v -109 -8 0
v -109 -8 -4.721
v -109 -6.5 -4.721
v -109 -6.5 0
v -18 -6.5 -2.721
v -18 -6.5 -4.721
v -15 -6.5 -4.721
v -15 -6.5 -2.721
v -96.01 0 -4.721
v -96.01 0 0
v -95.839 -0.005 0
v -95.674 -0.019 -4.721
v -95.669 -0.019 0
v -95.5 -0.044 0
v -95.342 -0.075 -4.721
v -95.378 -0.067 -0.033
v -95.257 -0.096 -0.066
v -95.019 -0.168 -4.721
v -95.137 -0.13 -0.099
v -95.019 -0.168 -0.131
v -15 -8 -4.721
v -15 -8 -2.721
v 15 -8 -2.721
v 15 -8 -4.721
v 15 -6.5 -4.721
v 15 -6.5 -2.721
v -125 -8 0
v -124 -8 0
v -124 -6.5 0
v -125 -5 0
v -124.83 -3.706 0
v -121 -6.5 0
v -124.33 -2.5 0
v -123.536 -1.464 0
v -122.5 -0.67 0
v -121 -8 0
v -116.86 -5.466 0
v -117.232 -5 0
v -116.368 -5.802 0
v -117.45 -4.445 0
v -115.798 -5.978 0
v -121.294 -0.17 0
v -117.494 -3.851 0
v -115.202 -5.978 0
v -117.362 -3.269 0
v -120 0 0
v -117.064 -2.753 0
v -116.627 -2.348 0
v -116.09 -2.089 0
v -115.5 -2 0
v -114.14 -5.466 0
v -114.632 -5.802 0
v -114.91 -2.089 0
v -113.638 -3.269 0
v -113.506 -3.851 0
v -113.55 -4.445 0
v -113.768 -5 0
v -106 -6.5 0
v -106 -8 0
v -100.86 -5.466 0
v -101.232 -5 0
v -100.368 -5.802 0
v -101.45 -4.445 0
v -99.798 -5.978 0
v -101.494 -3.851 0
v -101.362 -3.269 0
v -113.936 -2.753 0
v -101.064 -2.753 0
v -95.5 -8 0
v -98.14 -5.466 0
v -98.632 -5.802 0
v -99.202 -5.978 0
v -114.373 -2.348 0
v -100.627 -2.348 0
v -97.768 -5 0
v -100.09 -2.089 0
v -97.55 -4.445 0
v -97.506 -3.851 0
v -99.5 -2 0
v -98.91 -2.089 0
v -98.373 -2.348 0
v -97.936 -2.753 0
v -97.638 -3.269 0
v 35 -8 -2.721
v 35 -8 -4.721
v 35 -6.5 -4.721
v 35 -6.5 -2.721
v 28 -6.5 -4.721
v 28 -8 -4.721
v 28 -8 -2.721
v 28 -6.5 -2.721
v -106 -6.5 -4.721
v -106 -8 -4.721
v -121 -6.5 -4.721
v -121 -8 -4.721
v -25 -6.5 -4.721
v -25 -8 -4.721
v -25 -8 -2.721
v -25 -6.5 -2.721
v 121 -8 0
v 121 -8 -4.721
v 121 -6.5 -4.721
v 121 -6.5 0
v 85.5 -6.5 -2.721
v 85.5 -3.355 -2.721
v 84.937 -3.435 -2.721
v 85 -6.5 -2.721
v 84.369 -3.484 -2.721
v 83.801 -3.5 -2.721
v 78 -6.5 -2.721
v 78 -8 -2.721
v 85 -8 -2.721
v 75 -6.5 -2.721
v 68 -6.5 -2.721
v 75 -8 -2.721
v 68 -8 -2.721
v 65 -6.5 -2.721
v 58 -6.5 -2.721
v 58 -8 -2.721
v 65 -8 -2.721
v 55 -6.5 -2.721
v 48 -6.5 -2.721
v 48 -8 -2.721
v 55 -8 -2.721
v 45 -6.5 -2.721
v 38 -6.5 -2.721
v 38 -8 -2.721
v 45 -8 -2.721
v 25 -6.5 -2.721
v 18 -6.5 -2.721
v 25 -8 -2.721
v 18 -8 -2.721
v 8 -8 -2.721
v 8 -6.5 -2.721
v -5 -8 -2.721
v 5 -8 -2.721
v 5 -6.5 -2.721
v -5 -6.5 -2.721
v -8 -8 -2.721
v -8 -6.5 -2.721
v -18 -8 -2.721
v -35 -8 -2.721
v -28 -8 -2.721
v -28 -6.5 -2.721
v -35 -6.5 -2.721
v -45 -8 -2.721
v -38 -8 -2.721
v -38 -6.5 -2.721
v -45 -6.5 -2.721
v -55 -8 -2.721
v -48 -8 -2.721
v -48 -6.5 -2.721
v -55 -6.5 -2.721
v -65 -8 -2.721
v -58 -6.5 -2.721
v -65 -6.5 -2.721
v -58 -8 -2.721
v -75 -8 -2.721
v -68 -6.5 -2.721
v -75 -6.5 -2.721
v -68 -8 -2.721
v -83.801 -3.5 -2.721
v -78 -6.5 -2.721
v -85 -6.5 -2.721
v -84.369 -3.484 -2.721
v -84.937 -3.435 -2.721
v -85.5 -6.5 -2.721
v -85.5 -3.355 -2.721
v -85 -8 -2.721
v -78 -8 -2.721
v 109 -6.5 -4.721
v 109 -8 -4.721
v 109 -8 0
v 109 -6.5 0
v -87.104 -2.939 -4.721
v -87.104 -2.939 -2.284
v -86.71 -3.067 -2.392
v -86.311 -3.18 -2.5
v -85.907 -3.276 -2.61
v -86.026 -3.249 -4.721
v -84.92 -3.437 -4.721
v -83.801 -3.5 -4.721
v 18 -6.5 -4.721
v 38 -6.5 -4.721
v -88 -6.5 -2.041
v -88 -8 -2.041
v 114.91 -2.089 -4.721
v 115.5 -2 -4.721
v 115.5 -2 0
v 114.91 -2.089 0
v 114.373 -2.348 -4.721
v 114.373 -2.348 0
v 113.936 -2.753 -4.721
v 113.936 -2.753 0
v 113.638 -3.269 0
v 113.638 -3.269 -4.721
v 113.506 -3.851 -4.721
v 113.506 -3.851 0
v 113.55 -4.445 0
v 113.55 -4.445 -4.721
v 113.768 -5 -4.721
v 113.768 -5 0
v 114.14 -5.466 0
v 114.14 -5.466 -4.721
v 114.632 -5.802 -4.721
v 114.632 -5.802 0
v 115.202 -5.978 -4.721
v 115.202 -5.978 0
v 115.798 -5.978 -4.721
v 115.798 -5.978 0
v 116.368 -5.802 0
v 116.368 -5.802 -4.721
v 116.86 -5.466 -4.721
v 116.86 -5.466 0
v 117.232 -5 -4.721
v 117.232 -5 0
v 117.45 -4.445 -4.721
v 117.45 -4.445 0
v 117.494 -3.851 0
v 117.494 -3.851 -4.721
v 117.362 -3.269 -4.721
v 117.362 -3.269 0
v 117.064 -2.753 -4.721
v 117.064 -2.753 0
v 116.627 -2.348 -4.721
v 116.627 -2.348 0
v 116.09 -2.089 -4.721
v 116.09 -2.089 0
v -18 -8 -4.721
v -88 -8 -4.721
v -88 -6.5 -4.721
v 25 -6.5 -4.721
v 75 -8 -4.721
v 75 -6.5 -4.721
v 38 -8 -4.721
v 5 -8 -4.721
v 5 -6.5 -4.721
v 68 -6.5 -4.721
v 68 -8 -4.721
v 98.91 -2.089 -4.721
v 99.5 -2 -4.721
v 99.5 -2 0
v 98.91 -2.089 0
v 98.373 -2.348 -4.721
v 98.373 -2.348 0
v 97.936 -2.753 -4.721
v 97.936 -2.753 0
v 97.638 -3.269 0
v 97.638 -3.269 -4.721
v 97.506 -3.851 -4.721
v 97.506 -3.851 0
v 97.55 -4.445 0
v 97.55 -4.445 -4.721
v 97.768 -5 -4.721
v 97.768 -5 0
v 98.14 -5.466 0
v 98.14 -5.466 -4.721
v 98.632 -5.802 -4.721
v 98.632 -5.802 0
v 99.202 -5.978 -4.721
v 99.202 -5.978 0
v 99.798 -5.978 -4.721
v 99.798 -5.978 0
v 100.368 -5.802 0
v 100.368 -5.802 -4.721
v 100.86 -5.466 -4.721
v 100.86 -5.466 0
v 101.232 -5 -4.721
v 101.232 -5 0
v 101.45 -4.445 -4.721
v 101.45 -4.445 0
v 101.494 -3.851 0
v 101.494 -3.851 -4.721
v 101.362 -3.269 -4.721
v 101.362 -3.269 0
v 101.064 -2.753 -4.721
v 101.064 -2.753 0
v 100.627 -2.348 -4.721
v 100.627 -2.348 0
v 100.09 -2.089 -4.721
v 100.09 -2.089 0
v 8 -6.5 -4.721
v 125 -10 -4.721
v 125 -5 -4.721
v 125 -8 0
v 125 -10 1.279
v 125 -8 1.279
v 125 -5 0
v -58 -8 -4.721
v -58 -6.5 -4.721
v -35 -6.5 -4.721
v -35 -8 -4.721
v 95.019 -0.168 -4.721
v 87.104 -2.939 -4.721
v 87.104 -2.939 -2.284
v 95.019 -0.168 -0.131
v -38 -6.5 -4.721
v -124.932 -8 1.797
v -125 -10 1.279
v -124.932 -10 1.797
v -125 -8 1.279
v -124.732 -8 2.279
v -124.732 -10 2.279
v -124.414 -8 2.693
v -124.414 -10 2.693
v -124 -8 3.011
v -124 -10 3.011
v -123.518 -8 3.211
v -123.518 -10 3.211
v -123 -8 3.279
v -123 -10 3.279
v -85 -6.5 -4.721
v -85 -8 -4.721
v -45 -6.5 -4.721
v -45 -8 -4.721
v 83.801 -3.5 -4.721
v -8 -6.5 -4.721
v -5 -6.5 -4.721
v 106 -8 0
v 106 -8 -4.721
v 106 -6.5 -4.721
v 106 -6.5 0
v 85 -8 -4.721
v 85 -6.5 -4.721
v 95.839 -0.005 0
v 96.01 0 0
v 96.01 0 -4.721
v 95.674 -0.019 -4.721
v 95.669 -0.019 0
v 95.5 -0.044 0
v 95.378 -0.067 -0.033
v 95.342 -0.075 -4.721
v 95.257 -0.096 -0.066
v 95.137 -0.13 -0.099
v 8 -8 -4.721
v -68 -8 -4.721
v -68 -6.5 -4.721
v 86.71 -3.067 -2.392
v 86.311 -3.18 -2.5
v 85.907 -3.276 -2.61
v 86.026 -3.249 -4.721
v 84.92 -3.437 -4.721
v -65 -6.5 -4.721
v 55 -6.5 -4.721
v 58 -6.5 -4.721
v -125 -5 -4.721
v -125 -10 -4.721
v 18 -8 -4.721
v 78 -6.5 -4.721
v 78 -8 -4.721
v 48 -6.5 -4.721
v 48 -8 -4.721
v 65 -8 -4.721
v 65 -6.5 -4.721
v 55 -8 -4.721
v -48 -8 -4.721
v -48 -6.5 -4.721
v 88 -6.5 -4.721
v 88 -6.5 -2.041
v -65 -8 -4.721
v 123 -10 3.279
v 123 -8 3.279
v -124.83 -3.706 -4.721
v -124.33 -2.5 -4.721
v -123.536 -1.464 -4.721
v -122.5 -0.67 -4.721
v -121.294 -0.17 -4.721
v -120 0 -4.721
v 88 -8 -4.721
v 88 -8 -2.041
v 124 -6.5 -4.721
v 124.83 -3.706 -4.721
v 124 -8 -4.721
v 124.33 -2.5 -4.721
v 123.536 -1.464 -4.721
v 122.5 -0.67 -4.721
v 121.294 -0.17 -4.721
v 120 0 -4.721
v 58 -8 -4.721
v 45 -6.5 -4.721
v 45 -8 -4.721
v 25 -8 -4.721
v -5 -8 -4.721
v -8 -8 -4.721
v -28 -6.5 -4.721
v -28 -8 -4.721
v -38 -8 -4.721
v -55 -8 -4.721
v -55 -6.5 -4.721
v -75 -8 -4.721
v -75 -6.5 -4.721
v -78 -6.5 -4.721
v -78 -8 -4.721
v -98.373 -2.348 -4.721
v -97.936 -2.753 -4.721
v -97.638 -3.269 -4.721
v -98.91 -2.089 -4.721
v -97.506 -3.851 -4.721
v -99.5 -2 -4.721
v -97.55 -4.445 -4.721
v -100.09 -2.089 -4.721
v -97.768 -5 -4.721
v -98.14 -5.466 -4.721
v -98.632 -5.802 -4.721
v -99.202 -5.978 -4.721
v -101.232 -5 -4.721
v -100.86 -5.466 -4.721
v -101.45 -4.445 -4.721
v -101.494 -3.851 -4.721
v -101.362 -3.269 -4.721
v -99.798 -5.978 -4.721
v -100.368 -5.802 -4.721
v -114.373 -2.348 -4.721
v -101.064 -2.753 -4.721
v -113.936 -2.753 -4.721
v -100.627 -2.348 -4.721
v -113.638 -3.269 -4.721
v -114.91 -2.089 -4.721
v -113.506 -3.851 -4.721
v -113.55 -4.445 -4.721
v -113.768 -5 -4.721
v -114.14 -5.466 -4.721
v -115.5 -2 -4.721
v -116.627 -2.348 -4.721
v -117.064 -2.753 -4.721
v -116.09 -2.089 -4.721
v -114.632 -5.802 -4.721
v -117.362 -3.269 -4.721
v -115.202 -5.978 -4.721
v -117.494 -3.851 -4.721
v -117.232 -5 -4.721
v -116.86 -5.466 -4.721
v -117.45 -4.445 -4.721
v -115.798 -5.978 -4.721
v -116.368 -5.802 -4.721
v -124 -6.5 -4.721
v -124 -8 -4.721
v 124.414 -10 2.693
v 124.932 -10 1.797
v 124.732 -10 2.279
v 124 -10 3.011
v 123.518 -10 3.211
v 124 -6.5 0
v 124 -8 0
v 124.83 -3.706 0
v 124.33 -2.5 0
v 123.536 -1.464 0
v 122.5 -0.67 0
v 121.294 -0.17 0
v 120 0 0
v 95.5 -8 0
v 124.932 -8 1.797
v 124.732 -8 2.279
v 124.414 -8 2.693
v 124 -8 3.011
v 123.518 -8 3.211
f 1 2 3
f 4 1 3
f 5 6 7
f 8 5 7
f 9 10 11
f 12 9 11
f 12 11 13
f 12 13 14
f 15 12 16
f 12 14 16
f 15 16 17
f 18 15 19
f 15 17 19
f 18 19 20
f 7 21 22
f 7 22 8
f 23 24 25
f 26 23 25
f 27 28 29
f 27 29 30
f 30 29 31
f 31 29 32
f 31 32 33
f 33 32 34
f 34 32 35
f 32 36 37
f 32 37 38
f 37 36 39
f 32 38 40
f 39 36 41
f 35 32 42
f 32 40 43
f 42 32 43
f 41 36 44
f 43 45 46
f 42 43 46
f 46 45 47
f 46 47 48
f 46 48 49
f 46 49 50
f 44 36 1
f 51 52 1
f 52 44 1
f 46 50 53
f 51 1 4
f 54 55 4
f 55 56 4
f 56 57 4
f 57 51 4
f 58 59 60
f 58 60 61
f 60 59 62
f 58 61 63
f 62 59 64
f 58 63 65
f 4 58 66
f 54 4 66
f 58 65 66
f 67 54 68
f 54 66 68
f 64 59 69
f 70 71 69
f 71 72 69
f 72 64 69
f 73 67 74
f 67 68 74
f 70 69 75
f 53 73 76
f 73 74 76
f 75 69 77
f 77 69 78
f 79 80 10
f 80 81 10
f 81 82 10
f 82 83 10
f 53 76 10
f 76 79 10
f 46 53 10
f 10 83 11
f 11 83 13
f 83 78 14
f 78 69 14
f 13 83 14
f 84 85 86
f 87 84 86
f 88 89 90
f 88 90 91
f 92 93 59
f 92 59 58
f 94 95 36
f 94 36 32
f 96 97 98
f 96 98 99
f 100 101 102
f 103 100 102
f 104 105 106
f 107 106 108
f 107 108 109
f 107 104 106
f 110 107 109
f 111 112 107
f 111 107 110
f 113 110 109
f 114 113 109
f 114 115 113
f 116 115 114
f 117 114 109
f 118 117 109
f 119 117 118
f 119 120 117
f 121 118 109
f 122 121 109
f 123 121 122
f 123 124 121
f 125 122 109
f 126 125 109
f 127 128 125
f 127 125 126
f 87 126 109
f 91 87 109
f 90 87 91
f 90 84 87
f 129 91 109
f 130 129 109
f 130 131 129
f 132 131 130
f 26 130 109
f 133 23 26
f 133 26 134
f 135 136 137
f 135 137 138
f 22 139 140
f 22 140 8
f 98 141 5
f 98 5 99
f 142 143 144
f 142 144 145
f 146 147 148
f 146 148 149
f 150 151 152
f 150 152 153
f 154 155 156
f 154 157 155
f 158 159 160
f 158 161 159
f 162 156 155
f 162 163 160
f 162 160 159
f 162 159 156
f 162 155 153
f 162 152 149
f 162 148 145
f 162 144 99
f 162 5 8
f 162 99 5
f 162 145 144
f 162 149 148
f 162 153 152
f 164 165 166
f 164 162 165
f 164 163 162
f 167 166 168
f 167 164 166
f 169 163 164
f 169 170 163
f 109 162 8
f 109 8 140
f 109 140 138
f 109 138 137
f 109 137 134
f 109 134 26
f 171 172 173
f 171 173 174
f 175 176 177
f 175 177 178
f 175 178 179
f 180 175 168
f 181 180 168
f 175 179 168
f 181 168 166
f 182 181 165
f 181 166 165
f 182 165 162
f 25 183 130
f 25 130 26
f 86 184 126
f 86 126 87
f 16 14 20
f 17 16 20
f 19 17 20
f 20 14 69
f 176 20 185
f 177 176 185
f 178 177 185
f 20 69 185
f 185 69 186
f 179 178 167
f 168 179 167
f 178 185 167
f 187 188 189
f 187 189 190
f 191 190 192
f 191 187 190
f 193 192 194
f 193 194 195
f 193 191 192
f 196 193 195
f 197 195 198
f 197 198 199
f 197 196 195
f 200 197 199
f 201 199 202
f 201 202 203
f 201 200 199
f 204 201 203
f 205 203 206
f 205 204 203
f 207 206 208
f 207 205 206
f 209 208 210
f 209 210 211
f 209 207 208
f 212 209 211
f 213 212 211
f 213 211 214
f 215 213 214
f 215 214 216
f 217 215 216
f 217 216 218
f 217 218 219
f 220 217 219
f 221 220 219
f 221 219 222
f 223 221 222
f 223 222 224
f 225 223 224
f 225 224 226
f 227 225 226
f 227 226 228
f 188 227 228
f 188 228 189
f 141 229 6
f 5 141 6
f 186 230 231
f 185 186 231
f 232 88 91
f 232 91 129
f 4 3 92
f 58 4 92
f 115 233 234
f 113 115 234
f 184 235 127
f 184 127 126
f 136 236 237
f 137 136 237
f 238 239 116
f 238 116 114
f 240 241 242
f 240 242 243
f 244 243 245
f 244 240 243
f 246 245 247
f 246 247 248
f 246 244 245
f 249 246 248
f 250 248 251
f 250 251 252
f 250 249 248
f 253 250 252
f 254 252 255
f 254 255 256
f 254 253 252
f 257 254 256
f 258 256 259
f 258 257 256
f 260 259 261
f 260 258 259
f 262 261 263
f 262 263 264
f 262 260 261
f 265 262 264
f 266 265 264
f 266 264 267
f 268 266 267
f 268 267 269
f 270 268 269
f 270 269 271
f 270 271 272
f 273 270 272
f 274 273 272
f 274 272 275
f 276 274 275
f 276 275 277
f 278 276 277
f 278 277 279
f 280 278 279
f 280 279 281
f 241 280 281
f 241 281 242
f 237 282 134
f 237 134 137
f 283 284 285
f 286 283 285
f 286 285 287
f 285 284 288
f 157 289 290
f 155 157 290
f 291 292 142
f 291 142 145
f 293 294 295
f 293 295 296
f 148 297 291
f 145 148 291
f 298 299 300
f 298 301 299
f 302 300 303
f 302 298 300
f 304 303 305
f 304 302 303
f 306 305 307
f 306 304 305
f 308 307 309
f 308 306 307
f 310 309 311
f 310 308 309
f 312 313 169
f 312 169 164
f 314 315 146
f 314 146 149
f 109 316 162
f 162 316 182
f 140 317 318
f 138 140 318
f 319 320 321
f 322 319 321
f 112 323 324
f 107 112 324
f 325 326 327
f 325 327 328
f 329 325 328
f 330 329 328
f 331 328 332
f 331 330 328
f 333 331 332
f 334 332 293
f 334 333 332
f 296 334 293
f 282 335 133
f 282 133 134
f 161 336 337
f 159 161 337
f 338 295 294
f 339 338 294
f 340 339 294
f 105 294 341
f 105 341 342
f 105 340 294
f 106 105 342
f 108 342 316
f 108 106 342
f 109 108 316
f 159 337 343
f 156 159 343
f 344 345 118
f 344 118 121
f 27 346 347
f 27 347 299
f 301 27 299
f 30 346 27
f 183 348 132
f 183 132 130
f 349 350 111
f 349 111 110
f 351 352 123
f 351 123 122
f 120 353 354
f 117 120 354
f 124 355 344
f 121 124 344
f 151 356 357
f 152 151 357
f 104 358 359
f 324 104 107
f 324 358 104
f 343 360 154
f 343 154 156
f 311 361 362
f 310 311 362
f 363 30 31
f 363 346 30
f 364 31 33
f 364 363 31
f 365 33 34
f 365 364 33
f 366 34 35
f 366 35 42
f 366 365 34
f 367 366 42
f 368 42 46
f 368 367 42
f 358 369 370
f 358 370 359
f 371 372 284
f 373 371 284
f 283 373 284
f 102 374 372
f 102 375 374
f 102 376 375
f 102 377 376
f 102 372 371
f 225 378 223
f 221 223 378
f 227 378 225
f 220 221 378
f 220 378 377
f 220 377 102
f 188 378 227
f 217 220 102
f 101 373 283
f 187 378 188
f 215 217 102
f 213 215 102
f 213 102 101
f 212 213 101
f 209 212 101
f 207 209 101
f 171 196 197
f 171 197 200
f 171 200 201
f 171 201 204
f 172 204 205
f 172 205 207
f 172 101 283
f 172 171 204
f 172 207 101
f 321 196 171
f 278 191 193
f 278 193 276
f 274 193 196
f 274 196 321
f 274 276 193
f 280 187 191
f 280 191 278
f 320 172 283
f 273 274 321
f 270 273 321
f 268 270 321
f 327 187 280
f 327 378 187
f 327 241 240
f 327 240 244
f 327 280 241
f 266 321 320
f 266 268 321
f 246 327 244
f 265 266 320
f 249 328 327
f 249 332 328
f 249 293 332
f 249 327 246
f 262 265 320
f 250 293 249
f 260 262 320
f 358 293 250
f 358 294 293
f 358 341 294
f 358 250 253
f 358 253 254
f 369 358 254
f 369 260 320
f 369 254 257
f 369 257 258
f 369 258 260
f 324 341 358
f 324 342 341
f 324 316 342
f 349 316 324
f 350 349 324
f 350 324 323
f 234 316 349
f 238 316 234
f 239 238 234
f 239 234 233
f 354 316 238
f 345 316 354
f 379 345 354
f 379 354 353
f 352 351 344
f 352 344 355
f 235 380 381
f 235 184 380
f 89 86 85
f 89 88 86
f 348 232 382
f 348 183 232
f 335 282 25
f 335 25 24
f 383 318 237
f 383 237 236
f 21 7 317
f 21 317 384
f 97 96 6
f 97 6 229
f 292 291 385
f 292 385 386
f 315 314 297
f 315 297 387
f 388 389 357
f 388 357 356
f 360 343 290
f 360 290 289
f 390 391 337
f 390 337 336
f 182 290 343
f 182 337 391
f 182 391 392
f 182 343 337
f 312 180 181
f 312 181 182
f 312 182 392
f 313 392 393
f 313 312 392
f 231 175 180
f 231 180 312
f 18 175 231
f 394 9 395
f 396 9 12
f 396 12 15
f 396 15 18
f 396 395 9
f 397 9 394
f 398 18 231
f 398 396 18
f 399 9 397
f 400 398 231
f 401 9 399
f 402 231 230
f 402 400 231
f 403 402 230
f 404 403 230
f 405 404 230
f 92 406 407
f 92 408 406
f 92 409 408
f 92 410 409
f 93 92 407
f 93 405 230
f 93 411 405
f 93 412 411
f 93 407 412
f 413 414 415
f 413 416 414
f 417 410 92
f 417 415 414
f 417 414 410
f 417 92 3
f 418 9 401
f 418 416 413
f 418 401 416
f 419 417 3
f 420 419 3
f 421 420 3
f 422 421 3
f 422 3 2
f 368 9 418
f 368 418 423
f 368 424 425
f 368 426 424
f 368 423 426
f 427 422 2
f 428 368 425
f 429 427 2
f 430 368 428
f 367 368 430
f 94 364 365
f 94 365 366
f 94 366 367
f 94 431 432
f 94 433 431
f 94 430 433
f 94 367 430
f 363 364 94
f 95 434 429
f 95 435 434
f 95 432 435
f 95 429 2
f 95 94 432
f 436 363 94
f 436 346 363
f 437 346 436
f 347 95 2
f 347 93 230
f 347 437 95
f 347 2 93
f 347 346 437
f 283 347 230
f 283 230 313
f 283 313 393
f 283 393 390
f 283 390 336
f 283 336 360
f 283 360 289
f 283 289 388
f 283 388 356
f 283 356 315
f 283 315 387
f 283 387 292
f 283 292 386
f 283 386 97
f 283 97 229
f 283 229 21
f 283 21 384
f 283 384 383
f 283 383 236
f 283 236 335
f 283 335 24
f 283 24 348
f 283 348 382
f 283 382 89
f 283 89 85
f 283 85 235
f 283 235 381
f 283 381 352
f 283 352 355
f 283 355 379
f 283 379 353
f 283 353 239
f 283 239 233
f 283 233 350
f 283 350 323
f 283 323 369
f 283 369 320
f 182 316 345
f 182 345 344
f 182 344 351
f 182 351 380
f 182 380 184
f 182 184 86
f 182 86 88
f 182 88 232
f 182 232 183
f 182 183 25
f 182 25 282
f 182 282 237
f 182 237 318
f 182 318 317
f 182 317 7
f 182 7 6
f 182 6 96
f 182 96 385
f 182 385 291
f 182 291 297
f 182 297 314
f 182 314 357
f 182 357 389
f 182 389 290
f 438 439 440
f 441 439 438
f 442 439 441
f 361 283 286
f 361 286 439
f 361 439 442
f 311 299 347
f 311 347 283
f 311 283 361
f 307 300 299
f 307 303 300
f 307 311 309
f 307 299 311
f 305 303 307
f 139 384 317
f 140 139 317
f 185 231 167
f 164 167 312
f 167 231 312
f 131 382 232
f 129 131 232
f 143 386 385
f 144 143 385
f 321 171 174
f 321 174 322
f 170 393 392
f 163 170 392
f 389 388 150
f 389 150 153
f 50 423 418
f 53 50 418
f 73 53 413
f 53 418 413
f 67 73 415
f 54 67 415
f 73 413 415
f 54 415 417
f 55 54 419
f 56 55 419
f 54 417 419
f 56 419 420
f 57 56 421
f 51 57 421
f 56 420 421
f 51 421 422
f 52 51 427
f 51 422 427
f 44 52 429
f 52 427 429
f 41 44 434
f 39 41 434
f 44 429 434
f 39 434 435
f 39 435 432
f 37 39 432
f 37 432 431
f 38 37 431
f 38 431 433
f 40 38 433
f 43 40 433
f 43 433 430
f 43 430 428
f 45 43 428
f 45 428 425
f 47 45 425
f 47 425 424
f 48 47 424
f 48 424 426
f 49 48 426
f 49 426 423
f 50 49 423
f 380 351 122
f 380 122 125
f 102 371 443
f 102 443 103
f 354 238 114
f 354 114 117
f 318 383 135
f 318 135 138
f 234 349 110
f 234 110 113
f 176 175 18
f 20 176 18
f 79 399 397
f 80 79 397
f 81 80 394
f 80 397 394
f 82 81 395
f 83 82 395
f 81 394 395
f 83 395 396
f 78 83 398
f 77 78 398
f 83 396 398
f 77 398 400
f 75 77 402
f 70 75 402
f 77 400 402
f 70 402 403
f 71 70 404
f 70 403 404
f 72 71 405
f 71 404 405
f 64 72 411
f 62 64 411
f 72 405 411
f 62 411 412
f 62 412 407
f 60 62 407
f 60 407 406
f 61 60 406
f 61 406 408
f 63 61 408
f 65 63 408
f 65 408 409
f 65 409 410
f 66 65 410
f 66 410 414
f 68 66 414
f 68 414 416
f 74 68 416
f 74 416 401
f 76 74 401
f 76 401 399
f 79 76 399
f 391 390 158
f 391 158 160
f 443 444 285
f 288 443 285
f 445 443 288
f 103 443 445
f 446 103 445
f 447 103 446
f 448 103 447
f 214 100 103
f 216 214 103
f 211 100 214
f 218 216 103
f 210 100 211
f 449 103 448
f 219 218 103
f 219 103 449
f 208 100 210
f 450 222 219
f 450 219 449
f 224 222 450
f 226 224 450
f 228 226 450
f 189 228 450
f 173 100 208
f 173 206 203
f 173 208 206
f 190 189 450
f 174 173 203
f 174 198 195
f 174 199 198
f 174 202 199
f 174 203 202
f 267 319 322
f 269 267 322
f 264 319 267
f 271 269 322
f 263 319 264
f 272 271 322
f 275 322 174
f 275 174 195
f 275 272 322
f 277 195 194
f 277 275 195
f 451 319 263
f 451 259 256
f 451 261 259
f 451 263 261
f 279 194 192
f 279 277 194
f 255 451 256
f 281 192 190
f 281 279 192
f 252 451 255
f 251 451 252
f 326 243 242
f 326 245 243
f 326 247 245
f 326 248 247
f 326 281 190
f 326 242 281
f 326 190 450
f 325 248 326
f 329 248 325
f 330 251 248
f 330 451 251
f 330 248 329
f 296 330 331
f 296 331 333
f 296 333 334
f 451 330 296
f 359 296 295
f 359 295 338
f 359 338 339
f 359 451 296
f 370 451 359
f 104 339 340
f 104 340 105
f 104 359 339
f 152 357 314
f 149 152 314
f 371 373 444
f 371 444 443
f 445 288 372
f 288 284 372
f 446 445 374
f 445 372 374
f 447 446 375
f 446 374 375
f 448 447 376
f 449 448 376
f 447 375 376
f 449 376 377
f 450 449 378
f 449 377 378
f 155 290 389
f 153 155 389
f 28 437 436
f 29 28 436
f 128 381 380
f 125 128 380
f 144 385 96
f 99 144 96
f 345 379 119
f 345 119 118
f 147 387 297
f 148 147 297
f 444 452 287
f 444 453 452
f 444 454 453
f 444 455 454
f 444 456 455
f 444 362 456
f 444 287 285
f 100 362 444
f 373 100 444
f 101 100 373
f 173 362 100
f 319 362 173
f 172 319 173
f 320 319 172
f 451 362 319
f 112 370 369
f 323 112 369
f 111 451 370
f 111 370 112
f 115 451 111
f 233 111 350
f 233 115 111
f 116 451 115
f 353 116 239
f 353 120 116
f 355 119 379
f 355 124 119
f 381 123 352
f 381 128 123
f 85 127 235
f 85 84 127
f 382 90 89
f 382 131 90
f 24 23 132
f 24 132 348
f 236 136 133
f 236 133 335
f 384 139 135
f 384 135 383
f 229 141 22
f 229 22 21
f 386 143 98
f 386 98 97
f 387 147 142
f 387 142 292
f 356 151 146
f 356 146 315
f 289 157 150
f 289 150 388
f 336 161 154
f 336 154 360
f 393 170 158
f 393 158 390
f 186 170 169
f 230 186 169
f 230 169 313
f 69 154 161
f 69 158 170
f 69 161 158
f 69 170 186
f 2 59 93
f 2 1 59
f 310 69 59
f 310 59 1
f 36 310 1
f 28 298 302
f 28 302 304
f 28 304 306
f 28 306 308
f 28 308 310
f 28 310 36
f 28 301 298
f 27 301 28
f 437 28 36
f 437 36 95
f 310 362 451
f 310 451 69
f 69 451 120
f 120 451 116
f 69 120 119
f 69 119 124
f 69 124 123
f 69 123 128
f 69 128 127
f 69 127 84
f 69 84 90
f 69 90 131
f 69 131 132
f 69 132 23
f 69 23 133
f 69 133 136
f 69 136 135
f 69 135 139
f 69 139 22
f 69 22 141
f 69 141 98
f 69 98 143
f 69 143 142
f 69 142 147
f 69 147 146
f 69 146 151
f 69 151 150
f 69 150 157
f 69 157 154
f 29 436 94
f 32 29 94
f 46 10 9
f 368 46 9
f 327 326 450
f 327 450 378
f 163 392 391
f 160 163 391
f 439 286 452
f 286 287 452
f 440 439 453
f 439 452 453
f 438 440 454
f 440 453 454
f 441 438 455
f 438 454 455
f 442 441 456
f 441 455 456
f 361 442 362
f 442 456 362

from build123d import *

# Parameters (mm, degrees)
BOSS_EXTRUDE1_DEPTH     = 125
CUT_EXTRUDE2_DEPTH      = 126.344667089
CUT_EXTRUDE3_DEPTH      = 126.54282138
CUT_EXTRUDE3_DEPTH_BACK = 126.54282138
SKETCH3_W               = 3
SKETCH3_H               = 1.5
CUT_EXTRUDE4_DEPTH      = 126.54282138
CUT_EXTRUDE4_DEPTH_BACK = 126.54282138
SKETCH5_R               = 2
CUT_EXTRUDE5_DEPTH      = 126.654287631
FILLET1_R               = 5
FILLET2_R               = 3
FILLET3_R               = 10
FILLET4_R               = 2


with BuildPart() as part:
    # Sketch1 → Boss-Extrude1 (new body)
    with BuildSketch(Plane(origin=(0, 0, 0), x_dir=(0, 0, -1), z_dir=(1, 0, 0))):
        Polygon((-3.27924078, -8), (0, -8), (0, 0), (4.72075922, 0), (4.72075922, -10), (-3.27924078, -10), align=None)
    extrude(amount=-BOSS_EXTRUDE1_DEPTH)

    # Sketch2 → Cut-Extrude2 (cut, through all)
    with BuildSketch(Plane(origin=(0, -8, 0), x_dir=(1, 0, 0), z_dir=(0, 1, 0))):
        Polygon((-95.5, 0), (-85.5, 2.72075922), (0, 2.72075922), (0, 0), align=None)
    extrude(amount=CUT_EXTRUDE2_DEPTH, mode=Mode.SUBTRACT)

    # Sketch3 → Cut-Extrude3 (cut, two sides: drawn at the far end of the back side and taken through both)
    with BuildSketch(Plane.XY.offset(-2.72075922).offset(-CUT_EXTRUDE3_DEPTH_BACK)):
        with Locations((-122.5, -7.25)):
            Rectangle(SKETCH3_W, SKETCH3_H)
        with Locations((-6.5, -7.25)):
            Rectangle(SKETCH3_W, SKETCH3_H)
        with Locations((-16.5, -7.25)):
            Rectangle(SKETCH3_W, SKETCH3_H)
        with Locations((-26.5, -7.25)):
            Rectangle(SKETCH3_W, SKETCH3_H)
        with Locations((-36.5, -7.25)):
            Rectangle(SKETCH3_W, SKETCH3_H)
        with Locations((-46.5, -7.25)):
            Rectangle(SKETCH3_W, SKETCH3_H)
        with Locations((-56.5, -7.25)):
            Rectangle(SKETCH3_W, SKETCH3_H)
        with Locations((-66.5, -7.25)):
            Rectangle(SKETCH3_W, SKETCH3_H)
        with Locations((-76.5, -7.25)):
            Rectangle(SKETCH3_W, SKETCH3_H)
        with Locations((-86.5, -7.25)):
            Rectangle(SKETCH3_W, SKETCH3_H)
        with Locations((-107.5, -7.25)):
            Rectangle(SKETCH3_W, SKETCH3_H)
    extrude(amount=CUT_EXTRUDE3_DEPTH + CUT_EXTRUDE3_DEPTH_BACK, mode=Mode.SUBTRACT)

    # Sketch4 → Cut-Extrude4 (cut, two sides: drawn at the far end of the back side and taken through both)
    with BuildSketch(Plane.XY.offset(-2.72075922).offset(-CUT_EXTRUDE4_DEPTH_BACK)):
        Polygon((260.33777182, -3.5), (0, -3.5), (-85.5, -3.5), (-95.5, 0), (-341.22198141, 86.002693494), (-264.597067166, 601.009144194), (336.962686065, 511.5064507), align=None)
    extrude(amount=CUT_EXTRUDE4_DEPTH + CUT_EXTRUDE4_DEPTH_BACK, mode=Mode.SUBTRACT)

    # Sketch5 → Cut-Extrude5 (cut, through all)
    with BuildSketch(Plane(origin=(0, 0, -4.72075922), x_dir=(-1, 0, 0), z_dir=(0, 0, -1))):
        with Locations(Location((99.5, -4, 0), (0, 0, 90))):
            Circle(SKETCH5_R)
        with Locations(Location((115.5, -4, 0), (0, 0, 90))):
            Circle(SKETCH5_R)
    extrude(amount=-CUT_EXTRUDE5_DEPTH, mode=Mode.SUBTRACT)

    # Fillet1
    fillet1_edges = [part.edges().sort_by_distance(p)[0] for p in [
        (-125, 0, -2.36037961),
    ]]
    fillet(fillet1_edges, radius=FILLET1_R)

    # Fillet2
    fillet2_edges = [part.edges().sort_by_distance(p)[0] for p in [
        (-95.5, 0, -2.36037961),
    ]]
    fillet(fillet2_edges, radius=FILLET2_R)

    # Fillet3
    fillet3_edges = [part.edges().sort_by_distance(p)[0] for p in [
        (-85.5, -3.5, -3.72075922),
    ]]
    fillet(fillet3_edges, radius=FILLET3_R)

    # Fillet4
    fillet4_edges = [part.edges().sort_by_distance(p)[0] for p in [
        (-125, -9, 3.27924078),
    ]]
    fillet(fillet4_edges, radius=FILLET4_R)

    # Mirror1: part across plane


with BuildPart() as part_1:
    add(part.part)
    add(part.part.mirror(Plane.ZY))


solid = part_1.part
